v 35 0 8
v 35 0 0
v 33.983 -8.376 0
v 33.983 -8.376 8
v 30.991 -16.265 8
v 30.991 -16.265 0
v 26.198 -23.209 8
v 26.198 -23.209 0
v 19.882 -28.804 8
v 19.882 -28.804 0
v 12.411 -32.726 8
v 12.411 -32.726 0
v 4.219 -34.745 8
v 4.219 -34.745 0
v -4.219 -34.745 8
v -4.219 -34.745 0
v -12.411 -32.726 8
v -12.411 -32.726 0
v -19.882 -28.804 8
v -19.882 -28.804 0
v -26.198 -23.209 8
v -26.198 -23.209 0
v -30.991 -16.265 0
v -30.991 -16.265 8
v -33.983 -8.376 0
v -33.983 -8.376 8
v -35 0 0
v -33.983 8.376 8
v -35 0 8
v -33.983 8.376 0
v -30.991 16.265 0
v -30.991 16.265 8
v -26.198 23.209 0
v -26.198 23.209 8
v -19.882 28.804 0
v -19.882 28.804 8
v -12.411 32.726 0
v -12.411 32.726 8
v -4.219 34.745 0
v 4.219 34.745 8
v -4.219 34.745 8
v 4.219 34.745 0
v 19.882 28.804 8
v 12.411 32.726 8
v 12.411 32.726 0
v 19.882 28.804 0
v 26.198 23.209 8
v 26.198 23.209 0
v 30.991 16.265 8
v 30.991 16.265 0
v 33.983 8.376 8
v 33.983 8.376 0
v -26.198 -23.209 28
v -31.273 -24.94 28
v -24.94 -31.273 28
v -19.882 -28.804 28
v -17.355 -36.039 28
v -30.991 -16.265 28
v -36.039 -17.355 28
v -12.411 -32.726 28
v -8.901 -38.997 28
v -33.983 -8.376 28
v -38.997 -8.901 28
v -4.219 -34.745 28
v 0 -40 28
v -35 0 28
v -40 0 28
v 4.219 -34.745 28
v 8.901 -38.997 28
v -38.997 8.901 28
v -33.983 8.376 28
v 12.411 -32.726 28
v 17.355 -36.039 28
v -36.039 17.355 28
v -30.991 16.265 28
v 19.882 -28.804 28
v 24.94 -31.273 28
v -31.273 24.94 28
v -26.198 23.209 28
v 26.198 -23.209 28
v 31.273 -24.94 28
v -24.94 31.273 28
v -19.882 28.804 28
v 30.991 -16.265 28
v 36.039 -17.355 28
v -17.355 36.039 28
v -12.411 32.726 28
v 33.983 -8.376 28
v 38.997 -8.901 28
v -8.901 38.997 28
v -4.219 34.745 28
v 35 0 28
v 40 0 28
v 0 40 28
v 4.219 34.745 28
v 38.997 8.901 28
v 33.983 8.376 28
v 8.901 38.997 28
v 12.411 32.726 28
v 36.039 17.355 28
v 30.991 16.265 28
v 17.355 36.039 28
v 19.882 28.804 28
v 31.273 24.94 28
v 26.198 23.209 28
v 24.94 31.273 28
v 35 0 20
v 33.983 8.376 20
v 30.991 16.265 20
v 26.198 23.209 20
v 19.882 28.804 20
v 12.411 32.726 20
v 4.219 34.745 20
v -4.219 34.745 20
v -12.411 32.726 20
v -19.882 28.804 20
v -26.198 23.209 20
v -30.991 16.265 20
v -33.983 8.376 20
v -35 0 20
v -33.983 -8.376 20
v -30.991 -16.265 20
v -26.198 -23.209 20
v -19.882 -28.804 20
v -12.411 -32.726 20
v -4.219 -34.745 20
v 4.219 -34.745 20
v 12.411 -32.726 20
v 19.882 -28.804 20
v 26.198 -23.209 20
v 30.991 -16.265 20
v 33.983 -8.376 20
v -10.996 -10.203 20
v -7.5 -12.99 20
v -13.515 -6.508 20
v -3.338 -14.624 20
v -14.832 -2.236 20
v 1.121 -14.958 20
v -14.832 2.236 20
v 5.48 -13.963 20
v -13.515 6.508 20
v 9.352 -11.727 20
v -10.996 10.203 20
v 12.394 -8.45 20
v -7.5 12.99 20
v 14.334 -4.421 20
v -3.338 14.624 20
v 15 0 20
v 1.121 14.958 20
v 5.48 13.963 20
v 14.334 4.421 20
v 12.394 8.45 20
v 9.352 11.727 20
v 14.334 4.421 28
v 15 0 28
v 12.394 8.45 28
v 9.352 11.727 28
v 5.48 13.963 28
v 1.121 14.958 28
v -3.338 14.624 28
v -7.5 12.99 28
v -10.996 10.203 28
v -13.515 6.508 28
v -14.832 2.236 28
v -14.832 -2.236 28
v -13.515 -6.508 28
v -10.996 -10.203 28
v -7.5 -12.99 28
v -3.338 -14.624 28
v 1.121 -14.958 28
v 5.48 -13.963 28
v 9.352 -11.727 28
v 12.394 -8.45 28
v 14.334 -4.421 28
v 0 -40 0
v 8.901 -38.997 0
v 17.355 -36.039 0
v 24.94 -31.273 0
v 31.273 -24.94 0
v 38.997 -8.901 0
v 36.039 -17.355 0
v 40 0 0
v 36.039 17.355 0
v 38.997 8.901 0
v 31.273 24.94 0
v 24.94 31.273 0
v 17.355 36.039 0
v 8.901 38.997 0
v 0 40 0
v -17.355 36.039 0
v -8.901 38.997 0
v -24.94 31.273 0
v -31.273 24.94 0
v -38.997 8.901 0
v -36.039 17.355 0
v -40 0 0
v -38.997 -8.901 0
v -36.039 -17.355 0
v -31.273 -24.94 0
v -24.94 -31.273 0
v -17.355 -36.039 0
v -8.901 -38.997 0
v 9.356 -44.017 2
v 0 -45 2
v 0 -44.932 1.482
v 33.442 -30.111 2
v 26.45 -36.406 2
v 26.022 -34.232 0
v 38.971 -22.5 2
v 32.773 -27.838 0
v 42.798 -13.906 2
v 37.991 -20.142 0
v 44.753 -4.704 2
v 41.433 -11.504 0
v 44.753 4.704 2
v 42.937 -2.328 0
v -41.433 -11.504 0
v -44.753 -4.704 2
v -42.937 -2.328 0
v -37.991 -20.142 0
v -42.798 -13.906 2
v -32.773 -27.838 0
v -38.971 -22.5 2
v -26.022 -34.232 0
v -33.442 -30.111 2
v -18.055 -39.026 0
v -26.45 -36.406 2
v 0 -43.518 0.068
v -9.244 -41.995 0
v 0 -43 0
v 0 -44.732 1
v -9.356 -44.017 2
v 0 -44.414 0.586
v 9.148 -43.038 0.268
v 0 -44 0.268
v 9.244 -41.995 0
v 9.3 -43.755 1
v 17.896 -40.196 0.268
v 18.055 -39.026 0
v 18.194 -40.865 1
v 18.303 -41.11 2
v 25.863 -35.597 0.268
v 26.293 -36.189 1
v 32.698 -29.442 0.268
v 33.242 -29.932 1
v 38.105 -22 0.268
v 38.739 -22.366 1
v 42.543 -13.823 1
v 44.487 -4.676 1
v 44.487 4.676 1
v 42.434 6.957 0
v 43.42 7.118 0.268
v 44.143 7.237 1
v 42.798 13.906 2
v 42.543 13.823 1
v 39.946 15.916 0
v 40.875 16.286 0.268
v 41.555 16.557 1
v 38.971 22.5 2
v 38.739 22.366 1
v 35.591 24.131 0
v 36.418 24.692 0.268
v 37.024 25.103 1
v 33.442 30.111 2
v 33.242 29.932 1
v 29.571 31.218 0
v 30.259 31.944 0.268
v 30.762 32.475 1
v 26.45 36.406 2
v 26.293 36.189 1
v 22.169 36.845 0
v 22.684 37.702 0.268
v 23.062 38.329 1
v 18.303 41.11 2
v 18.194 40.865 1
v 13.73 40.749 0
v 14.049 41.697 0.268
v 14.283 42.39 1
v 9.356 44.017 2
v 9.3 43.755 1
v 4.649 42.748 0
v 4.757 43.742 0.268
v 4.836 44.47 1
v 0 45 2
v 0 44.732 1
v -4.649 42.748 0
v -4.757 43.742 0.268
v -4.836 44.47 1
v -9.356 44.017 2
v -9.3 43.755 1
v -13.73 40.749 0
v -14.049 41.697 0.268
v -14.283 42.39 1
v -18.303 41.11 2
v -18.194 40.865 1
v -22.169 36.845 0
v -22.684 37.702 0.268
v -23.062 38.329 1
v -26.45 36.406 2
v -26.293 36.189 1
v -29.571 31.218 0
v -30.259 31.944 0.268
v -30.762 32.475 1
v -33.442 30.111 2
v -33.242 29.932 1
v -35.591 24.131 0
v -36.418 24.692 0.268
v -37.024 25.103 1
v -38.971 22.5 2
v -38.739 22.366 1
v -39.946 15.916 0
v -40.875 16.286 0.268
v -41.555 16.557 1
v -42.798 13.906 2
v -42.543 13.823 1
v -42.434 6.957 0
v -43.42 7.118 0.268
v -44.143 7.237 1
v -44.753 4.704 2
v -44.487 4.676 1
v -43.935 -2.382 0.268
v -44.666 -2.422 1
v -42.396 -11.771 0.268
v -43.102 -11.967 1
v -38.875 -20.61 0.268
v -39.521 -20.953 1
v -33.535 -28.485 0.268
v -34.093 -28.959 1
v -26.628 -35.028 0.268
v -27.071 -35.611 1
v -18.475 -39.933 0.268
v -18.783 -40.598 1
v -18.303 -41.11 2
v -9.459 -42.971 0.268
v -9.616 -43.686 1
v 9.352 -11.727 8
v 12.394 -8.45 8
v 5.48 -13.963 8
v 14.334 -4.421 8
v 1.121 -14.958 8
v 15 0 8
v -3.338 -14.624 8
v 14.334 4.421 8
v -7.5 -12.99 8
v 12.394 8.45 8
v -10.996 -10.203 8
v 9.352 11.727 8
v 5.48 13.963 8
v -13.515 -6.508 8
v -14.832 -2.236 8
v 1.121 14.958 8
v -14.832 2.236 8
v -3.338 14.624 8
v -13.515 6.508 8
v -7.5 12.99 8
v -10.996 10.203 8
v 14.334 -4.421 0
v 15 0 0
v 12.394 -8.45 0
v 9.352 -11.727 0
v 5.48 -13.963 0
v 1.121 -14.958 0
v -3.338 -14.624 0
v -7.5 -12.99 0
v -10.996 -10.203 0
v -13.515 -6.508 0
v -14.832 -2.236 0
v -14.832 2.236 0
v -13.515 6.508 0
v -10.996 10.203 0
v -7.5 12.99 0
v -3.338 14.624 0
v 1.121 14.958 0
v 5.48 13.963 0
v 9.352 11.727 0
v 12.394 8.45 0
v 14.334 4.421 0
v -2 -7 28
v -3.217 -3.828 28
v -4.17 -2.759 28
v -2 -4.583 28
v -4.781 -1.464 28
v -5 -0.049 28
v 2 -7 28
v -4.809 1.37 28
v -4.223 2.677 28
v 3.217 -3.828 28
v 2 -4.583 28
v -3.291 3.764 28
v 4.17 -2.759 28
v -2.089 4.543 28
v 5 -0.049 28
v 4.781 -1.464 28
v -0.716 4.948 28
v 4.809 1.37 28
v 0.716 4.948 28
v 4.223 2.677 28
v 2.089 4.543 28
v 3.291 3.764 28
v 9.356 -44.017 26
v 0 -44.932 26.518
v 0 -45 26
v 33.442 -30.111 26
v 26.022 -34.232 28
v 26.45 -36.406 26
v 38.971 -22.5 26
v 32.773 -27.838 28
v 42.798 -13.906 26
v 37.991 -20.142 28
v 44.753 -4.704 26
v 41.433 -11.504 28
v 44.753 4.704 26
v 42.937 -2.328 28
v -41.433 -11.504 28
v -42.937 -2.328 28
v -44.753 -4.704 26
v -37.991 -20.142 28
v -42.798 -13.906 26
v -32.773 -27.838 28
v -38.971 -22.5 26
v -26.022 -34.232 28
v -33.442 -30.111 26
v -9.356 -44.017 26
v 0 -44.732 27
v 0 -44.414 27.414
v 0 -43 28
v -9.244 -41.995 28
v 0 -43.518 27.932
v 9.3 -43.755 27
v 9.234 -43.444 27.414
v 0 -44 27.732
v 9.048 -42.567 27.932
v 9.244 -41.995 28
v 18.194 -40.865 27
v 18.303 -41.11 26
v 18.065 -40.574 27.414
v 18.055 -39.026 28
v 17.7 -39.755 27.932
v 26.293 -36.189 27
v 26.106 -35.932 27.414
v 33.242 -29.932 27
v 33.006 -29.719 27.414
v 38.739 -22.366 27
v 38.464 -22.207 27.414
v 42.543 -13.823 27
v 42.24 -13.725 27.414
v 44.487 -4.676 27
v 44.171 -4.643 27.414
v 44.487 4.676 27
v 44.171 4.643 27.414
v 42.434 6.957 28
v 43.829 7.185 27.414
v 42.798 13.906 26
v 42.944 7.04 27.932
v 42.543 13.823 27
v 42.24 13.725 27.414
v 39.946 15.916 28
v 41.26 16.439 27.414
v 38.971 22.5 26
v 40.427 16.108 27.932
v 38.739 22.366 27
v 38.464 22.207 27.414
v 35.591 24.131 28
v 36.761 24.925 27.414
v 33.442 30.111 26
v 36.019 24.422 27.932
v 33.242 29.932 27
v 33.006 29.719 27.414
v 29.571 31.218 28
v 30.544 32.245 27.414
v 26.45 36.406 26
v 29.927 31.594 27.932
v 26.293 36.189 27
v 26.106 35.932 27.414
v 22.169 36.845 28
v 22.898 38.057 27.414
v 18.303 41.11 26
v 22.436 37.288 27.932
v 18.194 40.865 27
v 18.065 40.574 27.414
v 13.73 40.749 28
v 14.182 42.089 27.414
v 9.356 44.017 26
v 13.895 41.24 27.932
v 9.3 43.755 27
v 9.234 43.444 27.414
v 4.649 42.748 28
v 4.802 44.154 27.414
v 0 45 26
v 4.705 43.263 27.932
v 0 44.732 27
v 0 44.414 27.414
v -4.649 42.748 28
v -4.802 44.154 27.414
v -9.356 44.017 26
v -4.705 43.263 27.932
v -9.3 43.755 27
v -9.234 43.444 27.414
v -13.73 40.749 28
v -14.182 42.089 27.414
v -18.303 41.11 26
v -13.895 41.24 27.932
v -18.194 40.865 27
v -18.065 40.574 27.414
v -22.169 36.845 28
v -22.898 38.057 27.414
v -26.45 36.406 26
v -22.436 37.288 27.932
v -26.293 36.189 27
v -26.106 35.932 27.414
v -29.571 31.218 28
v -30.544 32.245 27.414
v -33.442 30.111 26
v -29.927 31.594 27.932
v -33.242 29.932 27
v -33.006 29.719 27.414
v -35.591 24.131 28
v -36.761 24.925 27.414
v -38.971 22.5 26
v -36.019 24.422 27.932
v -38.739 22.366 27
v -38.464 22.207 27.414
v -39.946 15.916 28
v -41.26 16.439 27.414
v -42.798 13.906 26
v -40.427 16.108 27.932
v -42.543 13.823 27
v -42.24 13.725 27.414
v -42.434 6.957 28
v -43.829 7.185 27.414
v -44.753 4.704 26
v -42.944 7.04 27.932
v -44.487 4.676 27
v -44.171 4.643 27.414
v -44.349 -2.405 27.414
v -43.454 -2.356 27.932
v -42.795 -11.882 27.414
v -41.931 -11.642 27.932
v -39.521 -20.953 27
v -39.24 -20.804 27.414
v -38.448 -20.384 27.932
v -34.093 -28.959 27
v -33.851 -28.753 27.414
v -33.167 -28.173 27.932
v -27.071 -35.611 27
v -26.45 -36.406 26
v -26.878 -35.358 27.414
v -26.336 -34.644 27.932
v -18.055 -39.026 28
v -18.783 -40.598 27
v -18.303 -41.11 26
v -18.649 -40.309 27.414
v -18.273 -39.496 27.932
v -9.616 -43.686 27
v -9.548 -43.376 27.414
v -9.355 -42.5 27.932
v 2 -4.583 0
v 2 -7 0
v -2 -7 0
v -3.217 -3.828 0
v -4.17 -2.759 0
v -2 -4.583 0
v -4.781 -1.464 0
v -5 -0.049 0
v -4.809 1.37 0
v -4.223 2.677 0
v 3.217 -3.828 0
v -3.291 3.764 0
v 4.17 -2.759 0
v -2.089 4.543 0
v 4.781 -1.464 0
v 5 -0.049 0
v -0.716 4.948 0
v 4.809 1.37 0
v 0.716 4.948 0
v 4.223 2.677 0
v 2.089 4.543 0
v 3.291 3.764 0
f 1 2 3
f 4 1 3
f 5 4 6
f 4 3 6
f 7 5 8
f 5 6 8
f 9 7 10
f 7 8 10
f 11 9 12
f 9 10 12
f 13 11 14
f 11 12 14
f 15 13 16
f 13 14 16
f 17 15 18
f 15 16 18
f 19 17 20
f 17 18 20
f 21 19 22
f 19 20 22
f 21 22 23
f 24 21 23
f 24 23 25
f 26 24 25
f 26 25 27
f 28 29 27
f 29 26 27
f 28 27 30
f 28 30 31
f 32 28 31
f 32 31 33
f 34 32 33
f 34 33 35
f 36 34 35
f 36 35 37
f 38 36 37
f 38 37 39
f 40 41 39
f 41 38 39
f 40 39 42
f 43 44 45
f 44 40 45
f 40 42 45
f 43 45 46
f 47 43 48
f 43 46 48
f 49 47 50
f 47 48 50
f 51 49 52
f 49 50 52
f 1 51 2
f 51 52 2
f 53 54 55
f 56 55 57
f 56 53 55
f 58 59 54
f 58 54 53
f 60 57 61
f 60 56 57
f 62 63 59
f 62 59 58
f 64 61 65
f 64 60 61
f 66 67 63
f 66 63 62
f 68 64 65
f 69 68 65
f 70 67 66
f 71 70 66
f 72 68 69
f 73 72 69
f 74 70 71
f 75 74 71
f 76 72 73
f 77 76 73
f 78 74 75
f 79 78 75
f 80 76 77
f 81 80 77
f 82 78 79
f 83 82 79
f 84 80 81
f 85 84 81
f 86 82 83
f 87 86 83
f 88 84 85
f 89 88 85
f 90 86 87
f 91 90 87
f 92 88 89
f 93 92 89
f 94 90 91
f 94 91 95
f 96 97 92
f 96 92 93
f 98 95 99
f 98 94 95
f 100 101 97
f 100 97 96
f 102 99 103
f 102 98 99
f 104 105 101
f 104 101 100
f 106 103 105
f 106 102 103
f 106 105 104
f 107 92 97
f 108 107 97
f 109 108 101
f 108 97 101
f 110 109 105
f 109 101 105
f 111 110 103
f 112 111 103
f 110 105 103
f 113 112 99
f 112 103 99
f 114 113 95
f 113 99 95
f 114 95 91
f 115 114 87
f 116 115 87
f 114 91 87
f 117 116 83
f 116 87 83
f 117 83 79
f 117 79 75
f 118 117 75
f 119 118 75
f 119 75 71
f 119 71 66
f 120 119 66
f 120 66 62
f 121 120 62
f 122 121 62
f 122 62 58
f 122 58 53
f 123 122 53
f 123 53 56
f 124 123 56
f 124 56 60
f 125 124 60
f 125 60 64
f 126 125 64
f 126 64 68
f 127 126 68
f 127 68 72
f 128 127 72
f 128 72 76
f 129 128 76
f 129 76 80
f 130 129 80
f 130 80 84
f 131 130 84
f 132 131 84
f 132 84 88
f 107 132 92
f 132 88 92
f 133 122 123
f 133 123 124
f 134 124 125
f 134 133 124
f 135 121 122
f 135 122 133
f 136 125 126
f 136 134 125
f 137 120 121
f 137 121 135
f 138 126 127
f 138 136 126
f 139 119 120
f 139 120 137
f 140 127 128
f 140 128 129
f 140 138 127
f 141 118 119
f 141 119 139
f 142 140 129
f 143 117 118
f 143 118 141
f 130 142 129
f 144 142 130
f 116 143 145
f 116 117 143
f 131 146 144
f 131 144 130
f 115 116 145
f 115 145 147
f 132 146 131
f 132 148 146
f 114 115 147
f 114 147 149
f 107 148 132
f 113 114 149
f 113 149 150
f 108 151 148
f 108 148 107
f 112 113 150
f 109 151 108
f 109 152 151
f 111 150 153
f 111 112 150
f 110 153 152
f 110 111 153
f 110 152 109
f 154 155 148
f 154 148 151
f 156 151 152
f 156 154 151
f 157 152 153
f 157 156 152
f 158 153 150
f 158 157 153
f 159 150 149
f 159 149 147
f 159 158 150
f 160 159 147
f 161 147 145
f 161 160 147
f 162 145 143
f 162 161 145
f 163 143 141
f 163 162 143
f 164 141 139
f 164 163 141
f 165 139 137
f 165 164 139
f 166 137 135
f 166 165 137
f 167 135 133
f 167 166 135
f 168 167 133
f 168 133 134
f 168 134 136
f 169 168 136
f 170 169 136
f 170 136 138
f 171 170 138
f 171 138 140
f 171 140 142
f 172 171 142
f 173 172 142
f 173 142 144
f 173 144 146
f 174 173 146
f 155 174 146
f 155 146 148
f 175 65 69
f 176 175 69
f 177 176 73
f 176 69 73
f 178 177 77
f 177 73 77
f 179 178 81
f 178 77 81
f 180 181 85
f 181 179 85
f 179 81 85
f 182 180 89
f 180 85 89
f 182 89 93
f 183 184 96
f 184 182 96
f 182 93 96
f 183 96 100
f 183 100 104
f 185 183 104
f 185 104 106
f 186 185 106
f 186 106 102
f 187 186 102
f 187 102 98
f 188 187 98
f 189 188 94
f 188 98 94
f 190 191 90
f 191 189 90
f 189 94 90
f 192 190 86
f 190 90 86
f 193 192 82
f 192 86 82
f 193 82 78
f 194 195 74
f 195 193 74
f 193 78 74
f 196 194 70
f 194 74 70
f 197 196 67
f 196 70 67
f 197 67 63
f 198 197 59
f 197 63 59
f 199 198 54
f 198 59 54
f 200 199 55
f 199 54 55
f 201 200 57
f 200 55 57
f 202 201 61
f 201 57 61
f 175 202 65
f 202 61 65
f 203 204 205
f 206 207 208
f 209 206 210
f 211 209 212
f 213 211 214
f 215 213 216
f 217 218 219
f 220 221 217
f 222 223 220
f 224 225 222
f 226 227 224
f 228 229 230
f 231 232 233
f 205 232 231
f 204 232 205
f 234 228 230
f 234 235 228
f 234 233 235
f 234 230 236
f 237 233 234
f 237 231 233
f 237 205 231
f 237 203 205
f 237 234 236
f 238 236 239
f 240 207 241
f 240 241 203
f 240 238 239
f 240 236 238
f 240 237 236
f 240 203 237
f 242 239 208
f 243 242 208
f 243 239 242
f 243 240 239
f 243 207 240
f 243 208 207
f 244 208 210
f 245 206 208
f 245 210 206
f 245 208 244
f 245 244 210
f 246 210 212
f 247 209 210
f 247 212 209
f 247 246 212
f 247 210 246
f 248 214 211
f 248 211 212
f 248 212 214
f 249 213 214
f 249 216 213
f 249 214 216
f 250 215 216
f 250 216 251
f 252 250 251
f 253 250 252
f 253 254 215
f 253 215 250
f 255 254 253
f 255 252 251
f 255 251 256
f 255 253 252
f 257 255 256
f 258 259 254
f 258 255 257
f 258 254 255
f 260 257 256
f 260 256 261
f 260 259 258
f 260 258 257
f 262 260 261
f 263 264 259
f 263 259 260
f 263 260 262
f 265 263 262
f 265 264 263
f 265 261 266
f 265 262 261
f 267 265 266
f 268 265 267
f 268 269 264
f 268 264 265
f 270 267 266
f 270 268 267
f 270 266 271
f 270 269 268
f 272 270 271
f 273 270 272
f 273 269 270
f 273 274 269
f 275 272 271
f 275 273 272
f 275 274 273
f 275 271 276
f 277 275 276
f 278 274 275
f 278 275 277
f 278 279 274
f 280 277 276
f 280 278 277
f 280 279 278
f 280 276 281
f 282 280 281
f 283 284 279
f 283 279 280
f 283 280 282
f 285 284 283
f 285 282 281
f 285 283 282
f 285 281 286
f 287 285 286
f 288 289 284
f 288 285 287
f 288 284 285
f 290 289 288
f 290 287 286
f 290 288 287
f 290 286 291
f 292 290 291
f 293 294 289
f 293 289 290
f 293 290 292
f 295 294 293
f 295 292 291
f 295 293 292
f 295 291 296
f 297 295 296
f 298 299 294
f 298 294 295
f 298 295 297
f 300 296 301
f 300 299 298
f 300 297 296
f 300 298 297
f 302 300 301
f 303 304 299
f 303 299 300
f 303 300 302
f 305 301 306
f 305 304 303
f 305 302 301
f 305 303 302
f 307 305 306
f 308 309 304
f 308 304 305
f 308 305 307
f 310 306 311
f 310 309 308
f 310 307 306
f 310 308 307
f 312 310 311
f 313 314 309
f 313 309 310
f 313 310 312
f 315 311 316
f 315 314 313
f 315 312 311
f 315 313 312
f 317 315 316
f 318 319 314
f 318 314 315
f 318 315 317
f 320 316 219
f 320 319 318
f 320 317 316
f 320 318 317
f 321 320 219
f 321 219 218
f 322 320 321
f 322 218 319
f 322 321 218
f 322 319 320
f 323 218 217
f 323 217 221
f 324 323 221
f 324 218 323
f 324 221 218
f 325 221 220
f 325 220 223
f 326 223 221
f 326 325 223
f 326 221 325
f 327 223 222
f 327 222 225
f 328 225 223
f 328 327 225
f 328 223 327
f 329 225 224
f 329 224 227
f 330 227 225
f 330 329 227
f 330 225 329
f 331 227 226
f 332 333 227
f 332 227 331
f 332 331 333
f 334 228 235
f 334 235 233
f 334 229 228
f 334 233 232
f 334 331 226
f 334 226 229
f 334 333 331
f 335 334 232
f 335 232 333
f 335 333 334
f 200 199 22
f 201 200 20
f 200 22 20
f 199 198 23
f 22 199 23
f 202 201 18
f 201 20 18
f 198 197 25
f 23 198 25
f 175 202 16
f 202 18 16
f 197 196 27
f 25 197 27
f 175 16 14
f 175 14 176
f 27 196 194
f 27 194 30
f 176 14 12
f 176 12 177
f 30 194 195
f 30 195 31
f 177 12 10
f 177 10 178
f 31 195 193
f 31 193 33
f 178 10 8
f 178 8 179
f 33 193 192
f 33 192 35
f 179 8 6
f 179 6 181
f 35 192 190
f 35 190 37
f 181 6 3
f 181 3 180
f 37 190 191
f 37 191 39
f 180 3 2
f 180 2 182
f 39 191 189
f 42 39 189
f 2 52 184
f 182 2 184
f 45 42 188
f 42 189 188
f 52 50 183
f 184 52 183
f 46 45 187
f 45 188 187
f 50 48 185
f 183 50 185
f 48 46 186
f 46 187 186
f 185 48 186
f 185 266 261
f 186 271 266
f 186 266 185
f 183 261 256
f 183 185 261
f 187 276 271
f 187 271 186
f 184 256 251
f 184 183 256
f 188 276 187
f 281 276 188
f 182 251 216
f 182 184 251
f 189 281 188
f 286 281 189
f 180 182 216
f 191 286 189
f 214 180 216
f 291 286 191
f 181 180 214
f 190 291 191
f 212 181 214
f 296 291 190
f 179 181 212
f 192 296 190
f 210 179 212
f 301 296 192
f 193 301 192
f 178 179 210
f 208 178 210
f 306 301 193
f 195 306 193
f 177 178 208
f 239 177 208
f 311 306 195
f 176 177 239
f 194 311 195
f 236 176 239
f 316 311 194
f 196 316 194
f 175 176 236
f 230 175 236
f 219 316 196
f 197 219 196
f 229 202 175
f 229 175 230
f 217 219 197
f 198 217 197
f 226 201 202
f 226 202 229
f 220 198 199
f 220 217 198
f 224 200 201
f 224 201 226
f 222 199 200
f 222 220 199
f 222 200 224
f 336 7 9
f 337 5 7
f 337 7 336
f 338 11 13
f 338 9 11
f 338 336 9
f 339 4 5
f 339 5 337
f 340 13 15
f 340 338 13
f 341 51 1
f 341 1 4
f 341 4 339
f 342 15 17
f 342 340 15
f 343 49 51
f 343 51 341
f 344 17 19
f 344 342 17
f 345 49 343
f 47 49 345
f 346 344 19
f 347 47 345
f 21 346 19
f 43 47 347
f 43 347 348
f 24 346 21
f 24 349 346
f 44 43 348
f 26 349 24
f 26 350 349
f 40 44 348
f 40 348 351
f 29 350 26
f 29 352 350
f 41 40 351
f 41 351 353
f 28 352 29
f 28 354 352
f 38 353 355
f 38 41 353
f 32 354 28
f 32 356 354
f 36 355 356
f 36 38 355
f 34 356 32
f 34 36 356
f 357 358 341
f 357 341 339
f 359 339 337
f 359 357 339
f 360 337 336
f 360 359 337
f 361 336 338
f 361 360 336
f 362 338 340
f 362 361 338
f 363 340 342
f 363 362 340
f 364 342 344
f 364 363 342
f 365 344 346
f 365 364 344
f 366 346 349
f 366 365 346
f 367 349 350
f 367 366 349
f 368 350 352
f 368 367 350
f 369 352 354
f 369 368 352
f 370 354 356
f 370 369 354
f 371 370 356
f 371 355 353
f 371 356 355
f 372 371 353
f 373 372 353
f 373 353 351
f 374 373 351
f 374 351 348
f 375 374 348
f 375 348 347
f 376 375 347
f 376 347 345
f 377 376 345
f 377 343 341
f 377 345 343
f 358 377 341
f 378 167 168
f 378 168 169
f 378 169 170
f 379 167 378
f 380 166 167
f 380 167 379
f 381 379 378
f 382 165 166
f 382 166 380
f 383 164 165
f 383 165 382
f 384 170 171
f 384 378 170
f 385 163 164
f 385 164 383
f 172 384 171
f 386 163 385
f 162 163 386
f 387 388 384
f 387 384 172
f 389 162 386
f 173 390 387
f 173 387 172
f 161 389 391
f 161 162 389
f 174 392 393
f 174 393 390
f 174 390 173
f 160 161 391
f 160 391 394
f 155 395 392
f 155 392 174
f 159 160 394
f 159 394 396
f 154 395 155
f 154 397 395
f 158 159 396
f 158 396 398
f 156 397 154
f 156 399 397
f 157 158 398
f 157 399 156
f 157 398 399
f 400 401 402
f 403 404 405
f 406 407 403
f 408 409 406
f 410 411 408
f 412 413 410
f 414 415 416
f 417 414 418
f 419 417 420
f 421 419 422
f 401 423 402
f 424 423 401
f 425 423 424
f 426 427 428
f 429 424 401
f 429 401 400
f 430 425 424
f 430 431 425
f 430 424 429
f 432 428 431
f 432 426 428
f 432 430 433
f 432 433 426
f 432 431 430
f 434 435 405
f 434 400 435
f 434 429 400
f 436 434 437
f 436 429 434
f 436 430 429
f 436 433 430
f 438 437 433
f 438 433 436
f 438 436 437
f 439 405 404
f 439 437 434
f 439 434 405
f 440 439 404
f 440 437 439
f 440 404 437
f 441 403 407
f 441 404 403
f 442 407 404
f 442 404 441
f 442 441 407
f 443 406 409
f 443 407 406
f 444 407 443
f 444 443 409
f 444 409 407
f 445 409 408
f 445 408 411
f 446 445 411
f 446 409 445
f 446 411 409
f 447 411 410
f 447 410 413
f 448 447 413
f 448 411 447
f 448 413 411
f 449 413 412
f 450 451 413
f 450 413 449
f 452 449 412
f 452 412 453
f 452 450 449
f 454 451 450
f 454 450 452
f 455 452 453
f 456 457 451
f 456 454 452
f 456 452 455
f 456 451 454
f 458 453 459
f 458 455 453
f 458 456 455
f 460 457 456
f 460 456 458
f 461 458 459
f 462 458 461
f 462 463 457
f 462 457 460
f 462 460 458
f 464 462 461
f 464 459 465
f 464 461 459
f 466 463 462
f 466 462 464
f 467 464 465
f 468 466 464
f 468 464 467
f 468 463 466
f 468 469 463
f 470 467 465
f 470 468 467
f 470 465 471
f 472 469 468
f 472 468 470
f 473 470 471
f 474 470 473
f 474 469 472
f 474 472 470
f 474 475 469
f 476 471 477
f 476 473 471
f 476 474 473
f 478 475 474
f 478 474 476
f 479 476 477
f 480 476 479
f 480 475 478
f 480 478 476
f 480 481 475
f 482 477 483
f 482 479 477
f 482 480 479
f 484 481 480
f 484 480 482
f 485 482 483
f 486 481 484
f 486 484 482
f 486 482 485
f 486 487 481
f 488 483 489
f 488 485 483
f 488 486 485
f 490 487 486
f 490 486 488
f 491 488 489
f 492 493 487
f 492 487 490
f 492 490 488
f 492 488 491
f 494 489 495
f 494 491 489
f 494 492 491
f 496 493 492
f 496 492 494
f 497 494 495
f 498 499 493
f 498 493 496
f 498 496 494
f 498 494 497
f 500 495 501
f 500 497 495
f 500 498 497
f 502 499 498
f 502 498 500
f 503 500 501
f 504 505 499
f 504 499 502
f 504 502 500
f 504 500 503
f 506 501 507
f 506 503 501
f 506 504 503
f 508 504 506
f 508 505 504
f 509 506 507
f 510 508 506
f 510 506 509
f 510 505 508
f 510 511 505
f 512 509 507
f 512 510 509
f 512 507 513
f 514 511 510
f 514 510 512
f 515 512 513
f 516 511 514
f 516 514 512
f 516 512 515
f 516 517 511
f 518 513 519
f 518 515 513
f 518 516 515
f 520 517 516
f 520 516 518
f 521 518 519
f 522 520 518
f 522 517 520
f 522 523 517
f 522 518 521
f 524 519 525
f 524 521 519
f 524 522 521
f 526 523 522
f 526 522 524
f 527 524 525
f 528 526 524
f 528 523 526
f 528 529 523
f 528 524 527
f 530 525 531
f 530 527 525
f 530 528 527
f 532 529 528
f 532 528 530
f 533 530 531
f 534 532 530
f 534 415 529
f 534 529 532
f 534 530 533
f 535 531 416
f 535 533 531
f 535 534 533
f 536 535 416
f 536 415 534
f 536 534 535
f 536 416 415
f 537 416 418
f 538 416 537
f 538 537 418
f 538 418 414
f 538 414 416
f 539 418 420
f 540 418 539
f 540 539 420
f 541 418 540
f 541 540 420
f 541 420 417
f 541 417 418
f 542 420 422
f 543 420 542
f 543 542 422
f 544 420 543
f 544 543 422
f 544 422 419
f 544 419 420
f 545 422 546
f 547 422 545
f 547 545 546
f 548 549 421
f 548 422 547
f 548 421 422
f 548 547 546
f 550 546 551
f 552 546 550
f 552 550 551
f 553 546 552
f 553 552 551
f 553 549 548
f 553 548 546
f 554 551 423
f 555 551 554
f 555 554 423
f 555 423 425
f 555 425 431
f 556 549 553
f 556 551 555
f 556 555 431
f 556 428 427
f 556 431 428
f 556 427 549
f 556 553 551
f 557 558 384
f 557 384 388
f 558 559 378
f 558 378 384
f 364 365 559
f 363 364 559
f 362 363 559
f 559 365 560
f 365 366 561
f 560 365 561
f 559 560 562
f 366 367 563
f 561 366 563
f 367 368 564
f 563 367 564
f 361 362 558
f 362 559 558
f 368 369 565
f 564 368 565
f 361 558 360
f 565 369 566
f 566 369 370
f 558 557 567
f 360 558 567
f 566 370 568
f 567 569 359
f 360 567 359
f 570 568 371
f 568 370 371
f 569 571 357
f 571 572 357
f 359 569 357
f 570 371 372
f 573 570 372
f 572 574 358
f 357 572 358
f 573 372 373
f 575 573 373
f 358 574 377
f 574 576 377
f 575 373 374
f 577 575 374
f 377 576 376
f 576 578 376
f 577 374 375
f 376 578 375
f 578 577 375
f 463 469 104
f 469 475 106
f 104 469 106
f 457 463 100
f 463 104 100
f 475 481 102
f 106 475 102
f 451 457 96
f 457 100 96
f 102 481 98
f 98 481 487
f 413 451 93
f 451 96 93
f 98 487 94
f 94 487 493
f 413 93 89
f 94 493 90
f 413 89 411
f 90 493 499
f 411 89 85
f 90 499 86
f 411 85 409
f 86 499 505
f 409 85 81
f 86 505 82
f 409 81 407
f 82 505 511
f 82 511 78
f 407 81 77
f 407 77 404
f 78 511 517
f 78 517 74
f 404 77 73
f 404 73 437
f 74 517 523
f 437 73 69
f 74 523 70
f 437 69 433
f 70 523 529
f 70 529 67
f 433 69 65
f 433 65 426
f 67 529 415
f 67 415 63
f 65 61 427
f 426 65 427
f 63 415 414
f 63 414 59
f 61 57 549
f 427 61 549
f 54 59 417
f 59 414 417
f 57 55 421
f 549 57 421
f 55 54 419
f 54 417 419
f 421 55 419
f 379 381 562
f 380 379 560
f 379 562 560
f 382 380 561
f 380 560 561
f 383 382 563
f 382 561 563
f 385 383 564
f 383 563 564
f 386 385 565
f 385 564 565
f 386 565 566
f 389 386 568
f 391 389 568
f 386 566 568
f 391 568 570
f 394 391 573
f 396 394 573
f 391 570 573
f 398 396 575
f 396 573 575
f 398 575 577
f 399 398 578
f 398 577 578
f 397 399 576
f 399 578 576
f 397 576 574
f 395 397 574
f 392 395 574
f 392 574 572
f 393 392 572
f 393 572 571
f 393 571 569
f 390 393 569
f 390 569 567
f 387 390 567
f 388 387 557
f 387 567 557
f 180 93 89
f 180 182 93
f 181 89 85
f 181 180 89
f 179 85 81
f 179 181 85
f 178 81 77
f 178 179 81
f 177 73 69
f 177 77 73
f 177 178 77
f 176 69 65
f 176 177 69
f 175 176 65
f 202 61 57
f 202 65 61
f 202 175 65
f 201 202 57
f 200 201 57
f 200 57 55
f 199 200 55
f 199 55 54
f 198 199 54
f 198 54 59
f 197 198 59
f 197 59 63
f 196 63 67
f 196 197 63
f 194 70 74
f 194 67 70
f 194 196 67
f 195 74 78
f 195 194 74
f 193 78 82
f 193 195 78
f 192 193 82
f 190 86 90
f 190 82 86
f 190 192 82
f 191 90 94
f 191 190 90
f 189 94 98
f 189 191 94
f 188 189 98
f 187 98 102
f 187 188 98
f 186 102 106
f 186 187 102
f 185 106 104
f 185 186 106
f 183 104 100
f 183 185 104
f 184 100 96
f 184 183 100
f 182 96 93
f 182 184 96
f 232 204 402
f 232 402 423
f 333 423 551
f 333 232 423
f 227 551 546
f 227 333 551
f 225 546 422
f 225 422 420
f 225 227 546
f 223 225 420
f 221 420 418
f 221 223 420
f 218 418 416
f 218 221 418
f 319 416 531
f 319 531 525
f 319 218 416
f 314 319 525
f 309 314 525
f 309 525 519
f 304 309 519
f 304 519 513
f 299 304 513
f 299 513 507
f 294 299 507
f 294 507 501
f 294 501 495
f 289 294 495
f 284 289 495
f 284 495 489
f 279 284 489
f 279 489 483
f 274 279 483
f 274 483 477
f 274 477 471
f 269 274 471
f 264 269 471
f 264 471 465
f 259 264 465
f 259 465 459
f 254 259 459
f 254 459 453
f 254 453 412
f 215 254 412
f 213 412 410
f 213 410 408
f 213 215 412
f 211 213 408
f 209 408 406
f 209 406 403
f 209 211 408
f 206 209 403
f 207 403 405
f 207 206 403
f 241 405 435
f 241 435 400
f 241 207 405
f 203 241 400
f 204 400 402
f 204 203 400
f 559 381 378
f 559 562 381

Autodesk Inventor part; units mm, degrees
ref_plane "YZ Plane" through (0, 0, 0) normal (1, 0, 0) x (0, 1, 0)
ref_plane "XZ Plane" through (0, 0, 0) normal (0, 1, 0) x (-1, 0, 0)
sketch "Sketch1" plane through (0, 0, 0) normal (0, 0, 1) x (1, 0, 0)
  circle A0 centre (0, 0) radius 40
  dimension "d0" = 80
extrude "Extrusion1" add sketch "Sketch1" along normal blind 28
sketch "Sketch2" plane through (0, 0, 28) normal (0, 0, 1) x (1, 0, 0)
  circle A0 centre (0, 0) radius 35
  circle A1 centre (0, 0) radius 15
  dimension "d3" = 70
  dimension "d4" = 30
extrude "Extrusion2" cut sketch "Sketch2" against normal blind 8
ref_plane "Work Plane1" through (0, 0, 14) normal (0, 0, 1) x (1, 0, 0)
mirror "Mirror1" about plane through (0, 0, 14) normal (0, 0, 1) of "Extrusion2"
sketch "Sketch3" plane through (0, 0, 0) normal (0, 0, -1) x (-1, 0, 0)
  circle A0 centre (0, 0) radius 5
  line L0 (0, -5) -> (0, -7)
  line L1 (0, -7) -> (-2, -7)
  line L2 (-2, -7) -> (-2, 0)
  line L3 (-2, 0) -> (2, 0)
  line L4 (2, 0) -> (2, -7)
  line L5 (2, -7) -> (0, -7)
  point P0 (2, -4.5826)
  point P1 (-2, -4.5826)
  dimension "d7" = 10
  dimension "d8" = 2
  dimension "d9" = 2
  dimension "d10" = 4
extrude "Extrusion3" cut sketch "Sketch3" against normal blind 30
sketch "Sketch4" plane through (0, 0, 0) normal (1, 0, 0) x (0, 1, 0)
  line L0 (40, 28) -> (-40, 28) projected
  line L1 (-40, 28) -> (-45, 28)
  line L2 (-45, 28) -> (-45, 0)
  line L3 (-45, 0) -> (-40, 0)
  line L4 (-40, 0) -> (-40, 28)
  line L5 (0, 28) -> (0, 0)
  line L6 (-4.5826, 0) -> (-4.5826, 28) projected
  dimension "d13" = 5
revolve "Revolution1" add sketch "Sketch4" angle 360 about axis through (0, 0, 28) along (0, 0, -1) separate body
fillet "Fillet1" radius 2 2 edges at (0, 45, 28) (0, 45, 0)
